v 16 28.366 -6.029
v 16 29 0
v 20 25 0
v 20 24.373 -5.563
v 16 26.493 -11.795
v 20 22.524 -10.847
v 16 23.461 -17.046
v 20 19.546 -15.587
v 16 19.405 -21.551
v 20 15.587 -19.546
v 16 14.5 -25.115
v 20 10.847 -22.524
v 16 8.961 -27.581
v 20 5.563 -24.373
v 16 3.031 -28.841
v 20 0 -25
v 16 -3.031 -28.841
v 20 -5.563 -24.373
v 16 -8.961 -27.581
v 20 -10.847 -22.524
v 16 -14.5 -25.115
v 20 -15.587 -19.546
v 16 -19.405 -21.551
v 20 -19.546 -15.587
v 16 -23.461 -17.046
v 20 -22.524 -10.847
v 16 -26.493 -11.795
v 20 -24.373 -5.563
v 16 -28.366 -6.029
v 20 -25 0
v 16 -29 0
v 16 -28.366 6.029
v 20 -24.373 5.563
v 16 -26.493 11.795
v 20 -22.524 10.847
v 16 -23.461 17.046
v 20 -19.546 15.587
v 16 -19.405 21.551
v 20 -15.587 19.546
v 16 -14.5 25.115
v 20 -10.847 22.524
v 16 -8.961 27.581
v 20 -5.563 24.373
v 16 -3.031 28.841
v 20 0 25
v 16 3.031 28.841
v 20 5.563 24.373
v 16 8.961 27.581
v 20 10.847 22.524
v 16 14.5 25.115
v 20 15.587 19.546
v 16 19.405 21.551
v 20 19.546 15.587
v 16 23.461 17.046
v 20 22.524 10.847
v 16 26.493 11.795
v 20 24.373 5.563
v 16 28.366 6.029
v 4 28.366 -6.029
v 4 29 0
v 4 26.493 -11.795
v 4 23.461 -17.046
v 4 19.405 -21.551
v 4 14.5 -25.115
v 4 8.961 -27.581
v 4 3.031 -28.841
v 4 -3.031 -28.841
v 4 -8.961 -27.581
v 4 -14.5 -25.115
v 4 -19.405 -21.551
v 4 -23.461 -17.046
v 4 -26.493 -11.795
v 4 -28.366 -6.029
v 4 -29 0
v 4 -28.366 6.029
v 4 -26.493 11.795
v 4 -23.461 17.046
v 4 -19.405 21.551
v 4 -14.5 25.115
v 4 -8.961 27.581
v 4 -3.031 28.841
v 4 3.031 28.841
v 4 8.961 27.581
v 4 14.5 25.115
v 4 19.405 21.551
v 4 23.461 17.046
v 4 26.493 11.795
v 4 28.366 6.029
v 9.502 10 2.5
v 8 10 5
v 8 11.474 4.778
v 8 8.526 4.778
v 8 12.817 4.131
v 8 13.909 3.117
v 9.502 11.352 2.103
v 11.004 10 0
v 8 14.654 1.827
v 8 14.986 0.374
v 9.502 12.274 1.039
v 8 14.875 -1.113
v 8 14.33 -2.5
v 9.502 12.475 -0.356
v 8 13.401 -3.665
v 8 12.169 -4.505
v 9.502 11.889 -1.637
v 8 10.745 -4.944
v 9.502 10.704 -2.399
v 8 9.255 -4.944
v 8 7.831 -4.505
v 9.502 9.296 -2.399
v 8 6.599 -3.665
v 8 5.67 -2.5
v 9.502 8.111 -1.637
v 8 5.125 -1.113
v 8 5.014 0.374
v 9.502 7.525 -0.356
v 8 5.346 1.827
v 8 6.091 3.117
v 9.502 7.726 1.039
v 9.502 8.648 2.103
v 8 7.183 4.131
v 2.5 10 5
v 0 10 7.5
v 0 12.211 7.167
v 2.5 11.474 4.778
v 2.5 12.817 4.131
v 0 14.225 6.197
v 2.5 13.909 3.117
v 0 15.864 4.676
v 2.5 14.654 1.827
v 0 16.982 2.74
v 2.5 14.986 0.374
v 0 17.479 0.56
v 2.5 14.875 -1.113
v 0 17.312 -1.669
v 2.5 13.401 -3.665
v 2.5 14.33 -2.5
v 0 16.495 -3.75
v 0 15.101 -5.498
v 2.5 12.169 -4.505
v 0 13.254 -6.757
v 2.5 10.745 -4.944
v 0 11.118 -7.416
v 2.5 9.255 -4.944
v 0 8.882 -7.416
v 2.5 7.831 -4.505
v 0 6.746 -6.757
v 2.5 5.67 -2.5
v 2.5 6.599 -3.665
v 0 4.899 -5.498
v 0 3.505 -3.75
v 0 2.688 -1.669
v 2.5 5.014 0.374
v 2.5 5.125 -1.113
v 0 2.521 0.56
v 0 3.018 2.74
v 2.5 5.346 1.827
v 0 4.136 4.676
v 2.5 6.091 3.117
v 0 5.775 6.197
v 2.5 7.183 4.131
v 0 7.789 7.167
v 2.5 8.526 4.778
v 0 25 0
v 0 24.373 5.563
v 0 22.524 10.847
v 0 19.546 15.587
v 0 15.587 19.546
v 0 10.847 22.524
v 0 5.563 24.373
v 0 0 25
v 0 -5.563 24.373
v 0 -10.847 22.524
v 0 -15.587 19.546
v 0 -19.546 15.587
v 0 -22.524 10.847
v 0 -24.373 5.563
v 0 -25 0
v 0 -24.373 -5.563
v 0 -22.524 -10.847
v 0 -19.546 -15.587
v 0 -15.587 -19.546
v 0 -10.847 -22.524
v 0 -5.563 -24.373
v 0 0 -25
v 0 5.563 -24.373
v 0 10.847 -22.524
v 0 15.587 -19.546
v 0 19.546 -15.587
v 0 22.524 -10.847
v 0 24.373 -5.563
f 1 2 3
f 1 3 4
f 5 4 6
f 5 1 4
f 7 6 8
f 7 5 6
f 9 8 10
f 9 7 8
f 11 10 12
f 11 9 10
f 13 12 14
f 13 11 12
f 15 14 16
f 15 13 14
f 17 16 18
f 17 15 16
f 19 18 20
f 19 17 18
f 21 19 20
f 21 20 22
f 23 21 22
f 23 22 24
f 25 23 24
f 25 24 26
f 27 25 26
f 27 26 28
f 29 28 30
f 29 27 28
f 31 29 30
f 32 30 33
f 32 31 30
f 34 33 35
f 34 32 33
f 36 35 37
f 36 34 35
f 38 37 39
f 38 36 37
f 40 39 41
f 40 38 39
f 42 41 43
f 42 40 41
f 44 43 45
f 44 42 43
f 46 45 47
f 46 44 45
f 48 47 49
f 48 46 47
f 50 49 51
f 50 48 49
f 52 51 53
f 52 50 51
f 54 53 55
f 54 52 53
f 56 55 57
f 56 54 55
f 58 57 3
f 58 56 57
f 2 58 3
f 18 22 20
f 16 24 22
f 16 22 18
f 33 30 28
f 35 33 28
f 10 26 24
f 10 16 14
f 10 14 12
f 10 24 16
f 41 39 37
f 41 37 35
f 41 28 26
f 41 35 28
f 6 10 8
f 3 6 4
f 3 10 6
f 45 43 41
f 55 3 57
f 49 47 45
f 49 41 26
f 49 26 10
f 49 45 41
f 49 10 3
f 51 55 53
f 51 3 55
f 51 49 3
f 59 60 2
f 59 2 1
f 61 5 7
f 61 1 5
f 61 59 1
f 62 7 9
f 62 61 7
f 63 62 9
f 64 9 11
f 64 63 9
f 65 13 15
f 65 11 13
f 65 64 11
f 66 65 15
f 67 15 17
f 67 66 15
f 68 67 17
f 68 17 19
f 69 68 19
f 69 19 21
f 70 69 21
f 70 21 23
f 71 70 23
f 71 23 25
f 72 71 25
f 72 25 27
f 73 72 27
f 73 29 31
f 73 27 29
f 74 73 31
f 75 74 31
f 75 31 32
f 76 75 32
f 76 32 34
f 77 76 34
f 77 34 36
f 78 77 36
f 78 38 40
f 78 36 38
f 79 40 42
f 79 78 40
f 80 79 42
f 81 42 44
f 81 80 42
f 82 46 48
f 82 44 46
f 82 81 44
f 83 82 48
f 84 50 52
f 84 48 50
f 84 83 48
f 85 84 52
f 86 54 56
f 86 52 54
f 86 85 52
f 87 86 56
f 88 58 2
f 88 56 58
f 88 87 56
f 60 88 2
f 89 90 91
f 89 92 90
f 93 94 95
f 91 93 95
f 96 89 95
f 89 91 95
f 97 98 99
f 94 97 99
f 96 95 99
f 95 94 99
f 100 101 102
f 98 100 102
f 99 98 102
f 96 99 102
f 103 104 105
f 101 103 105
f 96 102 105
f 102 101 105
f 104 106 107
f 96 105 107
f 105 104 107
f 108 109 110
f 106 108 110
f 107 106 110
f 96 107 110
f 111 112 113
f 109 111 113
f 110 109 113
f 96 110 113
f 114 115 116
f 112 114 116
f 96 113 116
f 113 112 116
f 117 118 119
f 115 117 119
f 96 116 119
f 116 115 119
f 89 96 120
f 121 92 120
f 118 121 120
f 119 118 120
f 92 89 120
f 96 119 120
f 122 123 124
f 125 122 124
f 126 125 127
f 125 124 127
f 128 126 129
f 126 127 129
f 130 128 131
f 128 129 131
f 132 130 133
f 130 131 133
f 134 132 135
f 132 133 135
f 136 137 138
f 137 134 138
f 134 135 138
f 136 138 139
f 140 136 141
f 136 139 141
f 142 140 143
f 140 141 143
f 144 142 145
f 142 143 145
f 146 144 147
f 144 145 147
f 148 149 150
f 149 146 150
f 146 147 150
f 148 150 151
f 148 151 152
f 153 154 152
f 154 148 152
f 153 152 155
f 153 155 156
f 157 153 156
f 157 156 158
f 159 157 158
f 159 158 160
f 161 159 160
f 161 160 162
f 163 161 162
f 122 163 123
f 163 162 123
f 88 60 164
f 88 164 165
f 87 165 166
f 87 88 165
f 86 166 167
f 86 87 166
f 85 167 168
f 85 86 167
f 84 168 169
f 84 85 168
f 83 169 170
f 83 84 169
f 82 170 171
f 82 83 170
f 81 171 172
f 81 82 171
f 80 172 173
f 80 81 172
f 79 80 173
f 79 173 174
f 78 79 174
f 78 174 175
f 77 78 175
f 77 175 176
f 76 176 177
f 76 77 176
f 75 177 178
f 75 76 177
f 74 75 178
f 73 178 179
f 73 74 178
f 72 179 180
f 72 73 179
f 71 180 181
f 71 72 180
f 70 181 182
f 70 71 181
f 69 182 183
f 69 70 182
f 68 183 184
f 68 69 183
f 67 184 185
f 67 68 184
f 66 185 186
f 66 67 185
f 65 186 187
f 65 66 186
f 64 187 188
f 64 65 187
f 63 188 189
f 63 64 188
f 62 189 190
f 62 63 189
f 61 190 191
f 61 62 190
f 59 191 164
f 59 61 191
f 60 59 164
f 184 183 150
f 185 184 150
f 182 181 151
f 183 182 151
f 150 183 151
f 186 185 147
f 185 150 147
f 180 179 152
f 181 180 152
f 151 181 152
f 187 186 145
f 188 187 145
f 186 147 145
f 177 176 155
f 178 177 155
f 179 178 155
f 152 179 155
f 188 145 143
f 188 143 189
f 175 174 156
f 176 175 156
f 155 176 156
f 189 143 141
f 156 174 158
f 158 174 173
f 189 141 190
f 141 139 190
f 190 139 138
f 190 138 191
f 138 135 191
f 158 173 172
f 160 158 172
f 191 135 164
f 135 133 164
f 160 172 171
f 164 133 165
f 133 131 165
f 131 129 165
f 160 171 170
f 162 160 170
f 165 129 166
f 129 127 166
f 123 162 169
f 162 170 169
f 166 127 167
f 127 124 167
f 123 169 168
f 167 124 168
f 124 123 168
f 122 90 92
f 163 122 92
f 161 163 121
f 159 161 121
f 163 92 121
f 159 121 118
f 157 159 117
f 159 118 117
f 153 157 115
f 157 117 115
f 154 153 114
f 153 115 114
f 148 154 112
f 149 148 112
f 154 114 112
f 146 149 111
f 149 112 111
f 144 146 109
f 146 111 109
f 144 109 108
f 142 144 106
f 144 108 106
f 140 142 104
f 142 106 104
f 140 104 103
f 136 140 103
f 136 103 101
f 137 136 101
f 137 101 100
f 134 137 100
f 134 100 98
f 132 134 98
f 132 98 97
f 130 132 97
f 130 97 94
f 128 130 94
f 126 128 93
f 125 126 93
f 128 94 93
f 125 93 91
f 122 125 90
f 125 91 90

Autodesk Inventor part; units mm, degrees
ref_plane "YZ Plane" through (0, 0, 0) normal (1, 0, 0) x (0, 1, 0)
ref_plane "XZ Plane" through (0, 0, 0) normal (0, 1, 0) x (-1, 0, 0)
ref_plane "XY Plane" through (0, 0, 0) normal (0, 0, 1) x (1, 0, 0)
sketch "Эскиз1" plane through (0, 0, 0) normal (0, 0, 1) x (1, 0, 0)
  line L0 (0, 0) -> (20, 0)
  line L1 (20, 0) -> (20, 25)
  line L2 (16, 29) -> (4, 29)
  line L3 (0, 25) -> (0, 0)
  line L4 (4, 29) -> (0, 25)
  line L5 (16, 29) -> (20, 25)
  point P0 (20, 29)
  point P1 (0, 29)
  dimension "d15" = 20
  dimension "d16" = 29
  dimension "d17" = 4
  dimension "d18" = 4
  dimension "d19" = 4
  dimension "d20" = 4
revolve "Вращение2" add sketch "Эскиз1" angle 360 about axis through (0, 0, 0) along (1, 0, 0)
sketch "Эскиз3" plane through (0, 0, 0) normal (-1, 0, 0) x (0, 0, 1)
  line L0 (0, 0) -> (0, 10) construction
  dimension "d22" = 10
hole "Отверстие2" at (0, 10, 0) direction (1, 0, 0) diameter 10 depth 8 tip angle 118 countersink diameter 15 countersink angle 90
equation "\"d18\" = d17"
equation "\"d19\" = d17"
equation "\"d20\" = d19"
properties part number "711112"
